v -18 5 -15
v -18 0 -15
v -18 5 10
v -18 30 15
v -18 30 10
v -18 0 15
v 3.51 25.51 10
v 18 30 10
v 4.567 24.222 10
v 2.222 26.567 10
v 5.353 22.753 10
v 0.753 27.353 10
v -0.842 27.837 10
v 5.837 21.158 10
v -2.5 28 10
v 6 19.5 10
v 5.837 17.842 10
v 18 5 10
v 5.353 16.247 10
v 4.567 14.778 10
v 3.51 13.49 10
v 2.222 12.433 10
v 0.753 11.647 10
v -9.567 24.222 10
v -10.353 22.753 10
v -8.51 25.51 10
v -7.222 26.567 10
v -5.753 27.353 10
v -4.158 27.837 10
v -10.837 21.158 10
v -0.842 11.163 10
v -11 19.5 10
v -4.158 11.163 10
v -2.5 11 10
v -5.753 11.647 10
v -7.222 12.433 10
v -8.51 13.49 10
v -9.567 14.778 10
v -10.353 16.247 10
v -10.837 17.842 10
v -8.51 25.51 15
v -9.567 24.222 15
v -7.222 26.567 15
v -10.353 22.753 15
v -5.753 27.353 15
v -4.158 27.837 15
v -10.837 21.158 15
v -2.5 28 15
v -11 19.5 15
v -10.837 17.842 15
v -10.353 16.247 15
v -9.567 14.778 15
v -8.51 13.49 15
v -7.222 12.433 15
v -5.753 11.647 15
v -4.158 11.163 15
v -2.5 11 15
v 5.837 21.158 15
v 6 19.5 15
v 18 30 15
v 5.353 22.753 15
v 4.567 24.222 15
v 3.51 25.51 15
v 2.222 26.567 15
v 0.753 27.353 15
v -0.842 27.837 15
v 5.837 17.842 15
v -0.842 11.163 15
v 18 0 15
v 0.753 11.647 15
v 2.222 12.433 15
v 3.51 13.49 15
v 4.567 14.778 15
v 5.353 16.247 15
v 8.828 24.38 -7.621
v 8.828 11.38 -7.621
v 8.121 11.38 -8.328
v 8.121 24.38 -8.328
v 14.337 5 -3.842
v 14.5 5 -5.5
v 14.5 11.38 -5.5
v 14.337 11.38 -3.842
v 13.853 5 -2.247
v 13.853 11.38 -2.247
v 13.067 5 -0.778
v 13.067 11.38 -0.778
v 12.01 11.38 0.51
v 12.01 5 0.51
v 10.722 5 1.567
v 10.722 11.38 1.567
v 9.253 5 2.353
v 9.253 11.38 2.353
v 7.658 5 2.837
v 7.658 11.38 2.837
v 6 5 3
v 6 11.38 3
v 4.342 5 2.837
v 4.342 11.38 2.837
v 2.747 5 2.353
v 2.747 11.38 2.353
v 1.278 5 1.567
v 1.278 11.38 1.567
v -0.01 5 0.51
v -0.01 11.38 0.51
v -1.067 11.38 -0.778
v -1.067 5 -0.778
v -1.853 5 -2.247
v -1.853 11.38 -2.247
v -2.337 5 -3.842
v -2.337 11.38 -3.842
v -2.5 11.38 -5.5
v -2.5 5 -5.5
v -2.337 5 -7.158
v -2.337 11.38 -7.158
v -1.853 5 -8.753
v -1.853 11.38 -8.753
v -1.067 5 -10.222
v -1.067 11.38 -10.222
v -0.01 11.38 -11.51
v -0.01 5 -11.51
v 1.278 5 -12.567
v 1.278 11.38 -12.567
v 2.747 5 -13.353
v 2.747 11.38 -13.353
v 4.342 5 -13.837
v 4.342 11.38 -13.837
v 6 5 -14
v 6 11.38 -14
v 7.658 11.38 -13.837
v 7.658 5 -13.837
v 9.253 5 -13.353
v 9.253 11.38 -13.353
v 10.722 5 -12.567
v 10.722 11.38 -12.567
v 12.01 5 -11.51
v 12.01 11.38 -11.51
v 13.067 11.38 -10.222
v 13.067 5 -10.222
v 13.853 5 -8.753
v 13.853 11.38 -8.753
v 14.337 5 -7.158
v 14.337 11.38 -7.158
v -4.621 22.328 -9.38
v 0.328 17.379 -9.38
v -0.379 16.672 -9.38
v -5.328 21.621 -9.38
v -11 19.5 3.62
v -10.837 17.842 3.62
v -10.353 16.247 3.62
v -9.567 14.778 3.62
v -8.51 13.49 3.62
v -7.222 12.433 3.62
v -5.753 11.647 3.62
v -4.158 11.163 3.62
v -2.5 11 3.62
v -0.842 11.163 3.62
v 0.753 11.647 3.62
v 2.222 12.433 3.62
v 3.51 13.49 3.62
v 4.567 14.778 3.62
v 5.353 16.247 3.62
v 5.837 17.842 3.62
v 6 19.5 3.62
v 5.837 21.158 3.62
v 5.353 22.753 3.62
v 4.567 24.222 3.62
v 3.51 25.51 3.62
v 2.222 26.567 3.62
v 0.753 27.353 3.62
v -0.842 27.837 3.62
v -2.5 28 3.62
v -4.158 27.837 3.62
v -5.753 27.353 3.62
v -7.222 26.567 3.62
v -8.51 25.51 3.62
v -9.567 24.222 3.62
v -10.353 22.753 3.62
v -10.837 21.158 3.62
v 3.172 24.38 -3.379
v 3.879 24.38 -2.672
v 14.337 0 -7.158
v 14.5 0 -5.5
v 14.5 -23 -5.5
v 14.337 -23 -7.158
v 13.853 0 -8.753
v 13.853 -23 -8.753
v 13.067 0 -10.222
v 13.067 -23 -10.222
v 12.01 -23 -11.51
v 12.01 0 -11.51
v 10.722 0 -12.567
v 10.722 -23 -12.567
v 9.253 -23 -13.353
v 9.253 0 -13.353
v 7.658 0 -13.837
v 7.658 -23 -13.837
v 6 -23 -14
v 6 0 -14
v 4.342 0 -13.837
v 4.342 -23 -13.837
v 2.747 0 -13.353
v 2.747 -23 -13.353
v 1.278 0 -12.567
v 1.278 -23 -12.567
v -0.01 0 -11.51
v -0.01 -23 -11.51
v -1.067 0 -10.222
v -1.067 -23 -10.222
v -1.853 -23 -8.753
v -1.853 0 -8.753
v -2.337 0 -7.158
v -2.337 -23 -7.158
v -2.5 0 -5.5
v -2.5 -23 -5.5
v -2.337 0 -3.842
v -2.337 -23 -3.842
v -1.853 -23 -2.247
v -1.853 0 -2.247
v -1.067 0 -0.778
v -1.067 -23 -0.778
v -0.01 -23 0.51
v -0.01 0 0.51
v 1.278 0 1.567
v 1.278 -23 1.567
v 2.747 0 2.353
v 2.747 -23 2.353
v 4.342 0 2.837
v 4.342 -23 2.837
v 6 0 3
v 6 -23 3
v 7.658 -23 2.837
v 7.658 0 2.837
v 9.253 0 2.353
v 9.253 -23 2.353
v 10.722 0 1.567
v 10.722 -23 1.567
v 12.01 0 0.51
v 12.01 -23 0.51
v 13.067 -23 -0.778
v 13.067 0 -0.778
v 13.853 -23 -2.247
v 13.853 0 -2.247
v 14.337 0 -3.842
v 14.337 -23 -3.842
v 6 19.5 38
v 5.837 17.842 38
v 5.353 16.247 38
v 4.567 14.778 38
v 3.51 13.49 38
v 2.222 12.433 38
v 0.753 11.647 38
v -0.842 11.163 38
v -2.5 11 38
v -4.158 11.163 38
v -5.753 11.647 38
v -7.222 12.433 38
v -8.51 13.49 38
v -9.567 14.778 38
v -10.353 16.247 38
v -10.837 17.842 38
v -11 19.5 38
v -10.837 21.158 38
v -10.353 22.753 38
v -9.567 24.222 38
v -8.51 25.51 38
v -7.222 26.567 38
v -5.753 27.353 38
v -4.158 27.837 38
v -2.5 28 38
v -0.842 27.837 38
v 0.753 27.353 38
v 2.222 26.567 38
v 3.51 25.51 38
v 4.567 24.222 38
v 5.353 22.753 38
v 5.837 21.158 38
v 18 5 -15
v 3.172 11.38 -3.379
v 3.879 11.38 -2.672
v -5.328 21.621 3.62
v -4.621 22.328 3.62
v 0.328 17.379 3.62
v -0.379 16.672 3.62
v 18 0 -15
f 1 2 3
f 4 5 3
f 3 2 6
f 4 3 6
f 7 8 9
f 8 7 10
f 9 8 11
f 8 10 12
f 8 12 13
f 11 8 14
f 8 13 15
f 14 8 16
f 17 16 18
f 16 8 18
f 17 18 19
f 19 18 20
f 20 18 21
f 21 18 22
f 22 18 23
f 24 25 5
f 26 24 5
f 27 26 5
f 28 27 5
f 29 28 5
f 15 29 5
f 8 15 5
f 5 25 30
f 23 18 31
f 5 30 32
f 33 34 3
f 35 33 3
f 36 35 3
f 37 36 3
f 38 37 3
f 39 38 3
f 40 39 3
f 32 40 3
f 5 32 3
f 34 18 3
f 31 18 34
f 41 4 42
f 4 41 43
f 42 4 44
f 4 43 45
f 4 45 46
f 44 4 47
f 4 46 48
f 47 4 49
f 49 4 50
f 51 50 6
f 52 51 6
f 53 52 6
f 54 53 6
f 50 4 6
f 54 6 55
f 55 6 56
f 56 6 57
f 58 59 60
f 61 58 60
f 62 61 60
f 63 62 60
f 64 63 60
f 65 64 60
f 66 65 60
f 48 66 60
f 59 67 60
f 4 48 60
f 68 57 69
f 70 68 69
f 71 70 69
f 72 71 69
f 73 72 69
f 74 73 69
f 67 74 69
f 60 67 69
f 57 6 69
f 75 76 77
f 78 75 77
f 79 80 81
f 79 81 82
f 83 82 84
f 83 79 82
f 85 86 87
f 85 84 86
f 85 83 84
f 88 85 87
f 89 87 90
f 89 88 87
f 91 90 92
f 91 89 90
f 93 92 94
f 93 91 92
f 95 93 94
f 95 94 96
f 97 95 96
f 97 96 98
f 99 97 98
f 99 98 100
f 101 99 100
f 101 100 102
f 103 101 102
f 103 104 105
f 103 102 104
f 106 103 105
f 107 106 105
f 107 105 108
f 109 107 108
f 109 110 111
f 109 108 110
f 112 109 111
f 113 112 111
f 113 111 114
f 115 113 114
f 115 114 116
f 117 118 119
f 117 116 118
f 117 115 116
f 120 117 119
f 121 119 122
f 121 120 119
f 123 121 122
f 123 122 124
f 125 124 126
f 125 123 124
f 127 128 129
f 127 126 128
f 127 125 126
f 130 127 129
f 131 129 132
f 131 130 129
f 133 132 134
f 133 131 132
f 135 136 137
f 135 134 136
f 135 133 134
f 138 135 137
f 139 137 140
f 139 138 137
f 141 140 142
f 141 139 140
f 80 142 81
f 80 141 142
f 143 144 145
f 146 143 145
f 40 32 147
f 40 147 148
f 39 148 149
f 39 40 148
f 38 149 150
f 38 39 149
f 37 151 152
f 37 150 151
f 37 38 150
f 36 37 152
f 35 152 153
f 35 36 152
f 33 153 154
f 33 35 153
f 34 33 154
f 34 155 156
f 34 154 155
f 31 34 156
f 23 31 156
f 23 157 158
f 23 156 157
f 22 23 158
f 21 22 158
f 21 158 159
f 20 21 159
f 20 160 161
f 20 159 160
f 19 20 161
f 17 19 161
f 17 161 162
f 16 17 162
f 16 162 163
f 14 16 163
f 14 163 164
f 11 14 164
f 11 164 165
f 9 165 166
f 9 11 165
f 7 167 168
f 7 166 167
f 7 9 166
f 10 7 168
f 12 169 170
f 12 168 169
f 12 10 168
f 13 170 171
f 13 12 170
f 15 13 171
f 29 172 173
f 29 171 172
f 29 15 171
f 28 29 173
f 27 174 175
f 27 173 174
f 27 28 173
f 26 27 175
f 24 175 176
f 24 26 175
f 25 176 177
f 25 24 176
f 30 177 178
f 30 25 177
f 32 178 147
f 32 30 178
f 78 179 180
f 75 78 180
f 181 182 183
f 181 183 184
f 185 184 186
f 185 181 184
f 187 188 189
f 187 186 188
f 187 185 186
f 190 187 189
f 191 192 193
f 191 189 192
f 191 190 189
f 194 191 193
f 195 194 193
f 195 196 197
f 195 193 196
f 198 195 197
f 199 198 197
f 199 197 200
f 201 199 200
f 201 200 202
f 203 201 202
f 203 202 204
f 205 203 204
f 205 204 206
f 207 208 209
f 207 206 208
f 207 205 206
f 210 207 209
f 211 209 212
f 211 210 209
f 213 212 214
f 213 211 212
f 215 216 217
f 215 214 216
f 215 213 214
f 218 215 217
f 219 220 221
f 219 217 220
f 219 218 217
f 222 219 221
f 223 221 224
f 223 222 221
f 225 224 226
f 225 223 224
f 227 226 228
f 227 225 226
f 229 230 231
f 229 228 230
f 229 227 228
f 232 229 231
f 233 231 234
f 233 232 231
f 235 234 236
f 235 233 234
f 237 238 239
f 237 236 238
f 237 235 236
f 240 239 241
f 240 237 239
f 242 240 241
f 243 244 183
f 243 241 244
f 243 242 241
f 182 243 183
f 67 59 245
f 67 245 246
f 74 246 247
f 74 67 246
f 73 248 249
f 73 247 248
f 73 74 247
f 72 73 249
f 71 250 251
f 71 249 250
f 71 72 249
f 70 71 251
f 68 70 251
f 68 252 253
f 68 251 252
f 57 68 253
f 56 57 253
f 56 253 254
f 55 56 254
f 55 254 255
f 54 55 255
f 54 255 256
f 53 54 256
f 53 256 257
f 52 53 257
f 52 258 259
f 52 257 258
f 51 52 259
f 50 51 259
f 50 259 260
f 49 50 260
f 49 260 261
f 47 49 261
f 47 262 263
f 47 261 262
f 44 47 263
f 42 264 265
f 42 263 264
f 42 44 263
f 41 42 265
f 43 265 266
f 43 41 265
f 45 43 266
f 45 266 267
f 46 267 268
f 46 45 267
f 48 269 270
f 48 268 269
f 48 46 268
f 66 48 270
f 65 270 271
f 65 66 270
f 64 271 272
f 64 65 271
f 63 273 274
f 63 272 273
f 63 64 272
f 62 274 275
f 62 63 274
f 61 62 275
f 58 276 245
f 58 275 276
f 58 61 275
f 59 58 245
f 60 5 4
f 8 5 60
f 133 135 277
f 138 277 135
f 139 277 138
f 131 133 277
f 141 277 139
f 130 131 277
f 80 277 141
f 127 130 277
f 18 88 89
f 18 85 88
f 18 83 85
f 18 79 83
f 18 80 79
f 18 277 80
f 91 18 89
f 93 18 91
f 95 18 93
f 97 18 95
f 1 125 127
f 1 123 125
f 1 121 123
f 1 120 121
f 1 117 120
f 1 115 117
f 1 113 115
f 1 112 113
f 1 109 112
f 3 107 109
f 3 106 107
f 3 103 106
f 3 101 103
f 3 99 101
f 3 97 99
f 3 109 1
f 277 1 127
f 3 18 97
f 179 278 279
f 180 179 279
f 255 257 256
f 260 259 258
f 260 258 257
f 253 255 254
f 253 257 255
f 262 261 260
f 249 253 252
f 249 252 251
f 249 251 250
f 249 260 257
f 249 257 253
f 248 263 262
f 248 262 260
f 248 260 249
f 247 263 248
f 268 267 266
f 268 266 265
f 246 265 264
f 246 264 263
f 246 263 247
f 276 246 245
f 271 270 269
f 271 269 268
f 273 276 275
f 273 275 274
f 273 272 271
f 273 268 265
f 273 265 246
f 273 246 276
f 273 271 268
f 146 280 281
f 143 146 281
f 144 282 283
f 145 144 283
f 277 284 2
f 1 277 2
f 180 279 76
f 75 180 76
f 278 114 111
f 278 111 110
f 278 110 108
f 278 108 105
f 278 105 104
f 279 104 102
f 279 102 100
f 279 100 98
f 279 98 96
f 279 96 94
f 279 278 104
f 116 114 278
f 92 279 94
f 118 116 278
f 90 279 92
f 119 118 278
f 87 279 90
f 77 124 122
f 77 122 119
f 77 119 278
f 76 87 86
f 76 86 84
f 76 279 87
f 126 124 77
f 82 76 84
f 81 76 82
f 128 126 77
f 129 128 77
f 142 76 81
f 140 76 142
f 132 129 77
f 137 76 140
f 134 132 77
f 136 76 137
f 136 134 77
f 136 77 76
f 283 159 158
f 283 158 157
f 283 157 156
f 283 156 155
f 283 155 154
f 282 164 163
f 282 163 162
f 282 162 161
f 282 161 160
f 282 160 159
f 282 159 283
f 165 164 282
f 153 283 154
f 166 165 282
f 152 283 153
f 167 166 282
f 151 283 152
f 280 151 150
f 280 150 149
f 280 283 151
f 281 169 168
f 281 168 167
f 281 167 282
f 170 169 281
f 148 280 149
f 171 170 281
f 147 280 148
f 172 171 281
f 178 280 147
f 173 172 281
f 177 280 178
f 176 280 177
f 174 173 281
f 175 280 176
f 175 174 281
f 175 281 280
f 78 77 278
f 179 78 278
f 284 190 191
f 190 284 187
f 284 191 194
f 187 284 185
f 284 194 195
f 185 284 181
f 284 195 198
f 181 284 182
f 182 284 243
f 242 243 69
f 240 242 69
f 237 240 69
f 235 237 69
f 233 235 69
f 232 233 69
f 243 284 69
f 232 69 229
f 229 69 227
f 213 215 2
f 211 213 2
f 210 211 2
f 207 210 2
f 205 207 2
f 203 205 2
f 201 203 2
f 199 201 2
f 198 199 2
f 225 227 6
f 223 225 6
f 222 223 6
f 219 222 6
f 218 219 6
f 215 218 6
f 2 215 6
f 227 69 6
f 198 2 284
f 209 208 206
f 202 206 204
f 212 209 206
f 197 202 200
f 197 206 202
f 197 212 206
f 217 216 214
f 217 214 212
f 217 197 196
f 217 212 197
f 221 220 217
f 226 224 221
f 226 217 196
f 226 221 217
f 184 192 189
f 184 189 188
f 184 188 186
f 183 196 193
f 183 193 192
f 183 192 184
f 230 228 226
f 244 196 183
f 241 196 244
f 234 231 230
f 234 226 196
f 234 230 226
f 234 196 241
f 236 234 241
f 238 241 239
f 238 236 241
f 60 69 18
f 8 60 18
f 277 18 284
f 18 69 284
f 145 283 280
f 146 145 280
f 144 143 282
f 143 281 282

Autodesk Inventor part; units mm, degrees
ref_plane "YZ Plane" through (0, 0, 0) normal (1, 0, 0) x (0, 1, 0)
ref_plane "XZ Plane" through (0, 0, 0) normal (0, 1, 0) x (-1, 0, 0)
ref_plane "XY Plane" through (0, 0, 0) normal (0, 0, 1) x (1, 0, 0)
sketch "Sketch1" plane through (0, 0, 0) normal (0, 1, 0) x (-1, 0, 0)
  line L0 (18, 15) -> (-18, 15)
  line L1 (-18, 15) -> (-18, -15)
  line L2 (-18, -15) -> (18, -15)
  line L3 (18, -15) -> (18, 15)
  point P0 (0, 0)
  point P1 (18, 0)
  point P2 (0, 15)
  dimension "d0" = 36
  dimension "d1" = 30
extrude "Extrusion1" add sketch "Sketch1" along normal blind 5
sketch "Sketch2" plane through (0, 5, 0) normal (0, 1, 0) x (1, 0, 0)
  line L0 (-18, -15) -> (18, -15) projected
  line L1 (-18, -15) -> (18, -15)
  line L2 (18, -15) -> (18, -10)
  line L3 (18, -10) -> (-18, -10)
  line L4 (-18, -10) -> (-18, -15)
  point P0 (0, 0)
  dimension "d4" = 5
extrude "Extrusion2" add sketch "Sketch2" along normal blind 25
sketch "Sketch3" plane through (0, 0, 0) normal (0, -1, 0) x (1, 0, 0)
  circle A0 centre (6, -5.5) radius 8.5
  line L0 (-18, 15) -> (18, 15) projected
  line L1 (18, 15) -> (18, -15) projected
  point P0 (0, 0)
  dimension "dGalvo" = 17
  dimension "d8" = 20.5
  dimension "d9" = 3.5
extrude "Extrusion3" add sketch "Sketch3" along normal blind 23
sketch "Sketch4" plane through (-18, 0, 15) normal (0, 0, 1) x (1, 0, 0)
  circle A0 centre (15.5, 19.5) radius 8.5
  line L0 (0, 30) -> (36, 30) projected
  line L1 (0, 0) -> (0, 30) projected
  point P0 (18, 0)
  dimension "d12" = 17
  dimension "d13" = 2
  dimension "d14" = 15.5
extrude "Extrusion4" add sketch "Sketch4" along normal blind 23
sketch "Sketch5" plane through (18, 5, 10) normal (0, 0, -1) x (-1, 0, 0)
  circle A0 centre (20.5, 14.5) radius 8.5 projected
  point P0 (18, -5)
extrude "Extrusion5" add sketch "Sketch5" along normal blind 6.38
sketch "Sketch6" plane through (0, 5, 0) normal (0, 1, 0) x (1, 0, 0)
  circle A0 centre (6, 5.5) radius 8.5 projected
  point P0 (0, 0)
extrude "Extrusion6" add sketch "Sketch6" along normal blind 6.38
sketch "Sketch7" plane through (6, 11.38, -5.5) normal (0, 1, 0) x (1, 0, 0)
  line L0 (-2.1213, -2.8284) -> (2.8284, 2.1213)
  line L1 (2.8284, 2.1213) -> (2.1213, 2.8284)
  line L2 (2.1213, 2.8284) -> (-2.8284, -2.1213)
  line L3 (-2.8284, -2.1213) -> (-2.1213, -2.8284)
  circle A0 centre (0, 0) radius 8.5 projected
  point P0 (-6, -5.5)
  point P1 (-2.4749, -2.4749)
  point P2 (0.3536, -0.3536)
  dimension "lenMirror" = 7
  dimension "thicknessMirror" = 1
extrude "Extrusion7" add sketch "Sketch7" along normal blind 13 contours L3 L2 L1 L0
sketch "Sketch8" plane through (-2.5, 19.5, 3.62) normal (0, 0, -1) x (-1, 0, 0)
  circle A0 centre (0, 0) radius 8.5 projected
  line L0 (2.1213, 2.8284) -> (-2.8284, -2.1213)
  line L1 (-2.8284, -2.1213) -> (-2.1213, -2.8284)
  line L2 (-2.1213, -2.8284) -> (2.8284, 2.1213)
  line L3 (2.8284, 2.1213) -> (2.1213, 2.8284)
  point P0 (-2.5, -19.5)
  point P1 (2.4749, 2.4749)
  point P2 (-0.3536, 0.3536)
  dimension "d25" = 7
  dimension "d26" = 1
extrude "Extrusion8" add sketch "Sketch8" along normal blind 13 contours L3 L2 L1 L0
equation "\"d12\" = dGalvo"
equation "\"d15\" = depthGalvo"
equation "\"d19\" = depthGalvoHead"
equation "\"d25\" = lenMirror"
equation "\"d26\" = thicknessMirror"
equation "\"d27\" = depthMirror"
equation "\"depthGalvo\" = 23"
equation "\"depthGalvoHead\" = 6.38"
equation "\"depthMirror\" = 13"
properties part number "galvos"
